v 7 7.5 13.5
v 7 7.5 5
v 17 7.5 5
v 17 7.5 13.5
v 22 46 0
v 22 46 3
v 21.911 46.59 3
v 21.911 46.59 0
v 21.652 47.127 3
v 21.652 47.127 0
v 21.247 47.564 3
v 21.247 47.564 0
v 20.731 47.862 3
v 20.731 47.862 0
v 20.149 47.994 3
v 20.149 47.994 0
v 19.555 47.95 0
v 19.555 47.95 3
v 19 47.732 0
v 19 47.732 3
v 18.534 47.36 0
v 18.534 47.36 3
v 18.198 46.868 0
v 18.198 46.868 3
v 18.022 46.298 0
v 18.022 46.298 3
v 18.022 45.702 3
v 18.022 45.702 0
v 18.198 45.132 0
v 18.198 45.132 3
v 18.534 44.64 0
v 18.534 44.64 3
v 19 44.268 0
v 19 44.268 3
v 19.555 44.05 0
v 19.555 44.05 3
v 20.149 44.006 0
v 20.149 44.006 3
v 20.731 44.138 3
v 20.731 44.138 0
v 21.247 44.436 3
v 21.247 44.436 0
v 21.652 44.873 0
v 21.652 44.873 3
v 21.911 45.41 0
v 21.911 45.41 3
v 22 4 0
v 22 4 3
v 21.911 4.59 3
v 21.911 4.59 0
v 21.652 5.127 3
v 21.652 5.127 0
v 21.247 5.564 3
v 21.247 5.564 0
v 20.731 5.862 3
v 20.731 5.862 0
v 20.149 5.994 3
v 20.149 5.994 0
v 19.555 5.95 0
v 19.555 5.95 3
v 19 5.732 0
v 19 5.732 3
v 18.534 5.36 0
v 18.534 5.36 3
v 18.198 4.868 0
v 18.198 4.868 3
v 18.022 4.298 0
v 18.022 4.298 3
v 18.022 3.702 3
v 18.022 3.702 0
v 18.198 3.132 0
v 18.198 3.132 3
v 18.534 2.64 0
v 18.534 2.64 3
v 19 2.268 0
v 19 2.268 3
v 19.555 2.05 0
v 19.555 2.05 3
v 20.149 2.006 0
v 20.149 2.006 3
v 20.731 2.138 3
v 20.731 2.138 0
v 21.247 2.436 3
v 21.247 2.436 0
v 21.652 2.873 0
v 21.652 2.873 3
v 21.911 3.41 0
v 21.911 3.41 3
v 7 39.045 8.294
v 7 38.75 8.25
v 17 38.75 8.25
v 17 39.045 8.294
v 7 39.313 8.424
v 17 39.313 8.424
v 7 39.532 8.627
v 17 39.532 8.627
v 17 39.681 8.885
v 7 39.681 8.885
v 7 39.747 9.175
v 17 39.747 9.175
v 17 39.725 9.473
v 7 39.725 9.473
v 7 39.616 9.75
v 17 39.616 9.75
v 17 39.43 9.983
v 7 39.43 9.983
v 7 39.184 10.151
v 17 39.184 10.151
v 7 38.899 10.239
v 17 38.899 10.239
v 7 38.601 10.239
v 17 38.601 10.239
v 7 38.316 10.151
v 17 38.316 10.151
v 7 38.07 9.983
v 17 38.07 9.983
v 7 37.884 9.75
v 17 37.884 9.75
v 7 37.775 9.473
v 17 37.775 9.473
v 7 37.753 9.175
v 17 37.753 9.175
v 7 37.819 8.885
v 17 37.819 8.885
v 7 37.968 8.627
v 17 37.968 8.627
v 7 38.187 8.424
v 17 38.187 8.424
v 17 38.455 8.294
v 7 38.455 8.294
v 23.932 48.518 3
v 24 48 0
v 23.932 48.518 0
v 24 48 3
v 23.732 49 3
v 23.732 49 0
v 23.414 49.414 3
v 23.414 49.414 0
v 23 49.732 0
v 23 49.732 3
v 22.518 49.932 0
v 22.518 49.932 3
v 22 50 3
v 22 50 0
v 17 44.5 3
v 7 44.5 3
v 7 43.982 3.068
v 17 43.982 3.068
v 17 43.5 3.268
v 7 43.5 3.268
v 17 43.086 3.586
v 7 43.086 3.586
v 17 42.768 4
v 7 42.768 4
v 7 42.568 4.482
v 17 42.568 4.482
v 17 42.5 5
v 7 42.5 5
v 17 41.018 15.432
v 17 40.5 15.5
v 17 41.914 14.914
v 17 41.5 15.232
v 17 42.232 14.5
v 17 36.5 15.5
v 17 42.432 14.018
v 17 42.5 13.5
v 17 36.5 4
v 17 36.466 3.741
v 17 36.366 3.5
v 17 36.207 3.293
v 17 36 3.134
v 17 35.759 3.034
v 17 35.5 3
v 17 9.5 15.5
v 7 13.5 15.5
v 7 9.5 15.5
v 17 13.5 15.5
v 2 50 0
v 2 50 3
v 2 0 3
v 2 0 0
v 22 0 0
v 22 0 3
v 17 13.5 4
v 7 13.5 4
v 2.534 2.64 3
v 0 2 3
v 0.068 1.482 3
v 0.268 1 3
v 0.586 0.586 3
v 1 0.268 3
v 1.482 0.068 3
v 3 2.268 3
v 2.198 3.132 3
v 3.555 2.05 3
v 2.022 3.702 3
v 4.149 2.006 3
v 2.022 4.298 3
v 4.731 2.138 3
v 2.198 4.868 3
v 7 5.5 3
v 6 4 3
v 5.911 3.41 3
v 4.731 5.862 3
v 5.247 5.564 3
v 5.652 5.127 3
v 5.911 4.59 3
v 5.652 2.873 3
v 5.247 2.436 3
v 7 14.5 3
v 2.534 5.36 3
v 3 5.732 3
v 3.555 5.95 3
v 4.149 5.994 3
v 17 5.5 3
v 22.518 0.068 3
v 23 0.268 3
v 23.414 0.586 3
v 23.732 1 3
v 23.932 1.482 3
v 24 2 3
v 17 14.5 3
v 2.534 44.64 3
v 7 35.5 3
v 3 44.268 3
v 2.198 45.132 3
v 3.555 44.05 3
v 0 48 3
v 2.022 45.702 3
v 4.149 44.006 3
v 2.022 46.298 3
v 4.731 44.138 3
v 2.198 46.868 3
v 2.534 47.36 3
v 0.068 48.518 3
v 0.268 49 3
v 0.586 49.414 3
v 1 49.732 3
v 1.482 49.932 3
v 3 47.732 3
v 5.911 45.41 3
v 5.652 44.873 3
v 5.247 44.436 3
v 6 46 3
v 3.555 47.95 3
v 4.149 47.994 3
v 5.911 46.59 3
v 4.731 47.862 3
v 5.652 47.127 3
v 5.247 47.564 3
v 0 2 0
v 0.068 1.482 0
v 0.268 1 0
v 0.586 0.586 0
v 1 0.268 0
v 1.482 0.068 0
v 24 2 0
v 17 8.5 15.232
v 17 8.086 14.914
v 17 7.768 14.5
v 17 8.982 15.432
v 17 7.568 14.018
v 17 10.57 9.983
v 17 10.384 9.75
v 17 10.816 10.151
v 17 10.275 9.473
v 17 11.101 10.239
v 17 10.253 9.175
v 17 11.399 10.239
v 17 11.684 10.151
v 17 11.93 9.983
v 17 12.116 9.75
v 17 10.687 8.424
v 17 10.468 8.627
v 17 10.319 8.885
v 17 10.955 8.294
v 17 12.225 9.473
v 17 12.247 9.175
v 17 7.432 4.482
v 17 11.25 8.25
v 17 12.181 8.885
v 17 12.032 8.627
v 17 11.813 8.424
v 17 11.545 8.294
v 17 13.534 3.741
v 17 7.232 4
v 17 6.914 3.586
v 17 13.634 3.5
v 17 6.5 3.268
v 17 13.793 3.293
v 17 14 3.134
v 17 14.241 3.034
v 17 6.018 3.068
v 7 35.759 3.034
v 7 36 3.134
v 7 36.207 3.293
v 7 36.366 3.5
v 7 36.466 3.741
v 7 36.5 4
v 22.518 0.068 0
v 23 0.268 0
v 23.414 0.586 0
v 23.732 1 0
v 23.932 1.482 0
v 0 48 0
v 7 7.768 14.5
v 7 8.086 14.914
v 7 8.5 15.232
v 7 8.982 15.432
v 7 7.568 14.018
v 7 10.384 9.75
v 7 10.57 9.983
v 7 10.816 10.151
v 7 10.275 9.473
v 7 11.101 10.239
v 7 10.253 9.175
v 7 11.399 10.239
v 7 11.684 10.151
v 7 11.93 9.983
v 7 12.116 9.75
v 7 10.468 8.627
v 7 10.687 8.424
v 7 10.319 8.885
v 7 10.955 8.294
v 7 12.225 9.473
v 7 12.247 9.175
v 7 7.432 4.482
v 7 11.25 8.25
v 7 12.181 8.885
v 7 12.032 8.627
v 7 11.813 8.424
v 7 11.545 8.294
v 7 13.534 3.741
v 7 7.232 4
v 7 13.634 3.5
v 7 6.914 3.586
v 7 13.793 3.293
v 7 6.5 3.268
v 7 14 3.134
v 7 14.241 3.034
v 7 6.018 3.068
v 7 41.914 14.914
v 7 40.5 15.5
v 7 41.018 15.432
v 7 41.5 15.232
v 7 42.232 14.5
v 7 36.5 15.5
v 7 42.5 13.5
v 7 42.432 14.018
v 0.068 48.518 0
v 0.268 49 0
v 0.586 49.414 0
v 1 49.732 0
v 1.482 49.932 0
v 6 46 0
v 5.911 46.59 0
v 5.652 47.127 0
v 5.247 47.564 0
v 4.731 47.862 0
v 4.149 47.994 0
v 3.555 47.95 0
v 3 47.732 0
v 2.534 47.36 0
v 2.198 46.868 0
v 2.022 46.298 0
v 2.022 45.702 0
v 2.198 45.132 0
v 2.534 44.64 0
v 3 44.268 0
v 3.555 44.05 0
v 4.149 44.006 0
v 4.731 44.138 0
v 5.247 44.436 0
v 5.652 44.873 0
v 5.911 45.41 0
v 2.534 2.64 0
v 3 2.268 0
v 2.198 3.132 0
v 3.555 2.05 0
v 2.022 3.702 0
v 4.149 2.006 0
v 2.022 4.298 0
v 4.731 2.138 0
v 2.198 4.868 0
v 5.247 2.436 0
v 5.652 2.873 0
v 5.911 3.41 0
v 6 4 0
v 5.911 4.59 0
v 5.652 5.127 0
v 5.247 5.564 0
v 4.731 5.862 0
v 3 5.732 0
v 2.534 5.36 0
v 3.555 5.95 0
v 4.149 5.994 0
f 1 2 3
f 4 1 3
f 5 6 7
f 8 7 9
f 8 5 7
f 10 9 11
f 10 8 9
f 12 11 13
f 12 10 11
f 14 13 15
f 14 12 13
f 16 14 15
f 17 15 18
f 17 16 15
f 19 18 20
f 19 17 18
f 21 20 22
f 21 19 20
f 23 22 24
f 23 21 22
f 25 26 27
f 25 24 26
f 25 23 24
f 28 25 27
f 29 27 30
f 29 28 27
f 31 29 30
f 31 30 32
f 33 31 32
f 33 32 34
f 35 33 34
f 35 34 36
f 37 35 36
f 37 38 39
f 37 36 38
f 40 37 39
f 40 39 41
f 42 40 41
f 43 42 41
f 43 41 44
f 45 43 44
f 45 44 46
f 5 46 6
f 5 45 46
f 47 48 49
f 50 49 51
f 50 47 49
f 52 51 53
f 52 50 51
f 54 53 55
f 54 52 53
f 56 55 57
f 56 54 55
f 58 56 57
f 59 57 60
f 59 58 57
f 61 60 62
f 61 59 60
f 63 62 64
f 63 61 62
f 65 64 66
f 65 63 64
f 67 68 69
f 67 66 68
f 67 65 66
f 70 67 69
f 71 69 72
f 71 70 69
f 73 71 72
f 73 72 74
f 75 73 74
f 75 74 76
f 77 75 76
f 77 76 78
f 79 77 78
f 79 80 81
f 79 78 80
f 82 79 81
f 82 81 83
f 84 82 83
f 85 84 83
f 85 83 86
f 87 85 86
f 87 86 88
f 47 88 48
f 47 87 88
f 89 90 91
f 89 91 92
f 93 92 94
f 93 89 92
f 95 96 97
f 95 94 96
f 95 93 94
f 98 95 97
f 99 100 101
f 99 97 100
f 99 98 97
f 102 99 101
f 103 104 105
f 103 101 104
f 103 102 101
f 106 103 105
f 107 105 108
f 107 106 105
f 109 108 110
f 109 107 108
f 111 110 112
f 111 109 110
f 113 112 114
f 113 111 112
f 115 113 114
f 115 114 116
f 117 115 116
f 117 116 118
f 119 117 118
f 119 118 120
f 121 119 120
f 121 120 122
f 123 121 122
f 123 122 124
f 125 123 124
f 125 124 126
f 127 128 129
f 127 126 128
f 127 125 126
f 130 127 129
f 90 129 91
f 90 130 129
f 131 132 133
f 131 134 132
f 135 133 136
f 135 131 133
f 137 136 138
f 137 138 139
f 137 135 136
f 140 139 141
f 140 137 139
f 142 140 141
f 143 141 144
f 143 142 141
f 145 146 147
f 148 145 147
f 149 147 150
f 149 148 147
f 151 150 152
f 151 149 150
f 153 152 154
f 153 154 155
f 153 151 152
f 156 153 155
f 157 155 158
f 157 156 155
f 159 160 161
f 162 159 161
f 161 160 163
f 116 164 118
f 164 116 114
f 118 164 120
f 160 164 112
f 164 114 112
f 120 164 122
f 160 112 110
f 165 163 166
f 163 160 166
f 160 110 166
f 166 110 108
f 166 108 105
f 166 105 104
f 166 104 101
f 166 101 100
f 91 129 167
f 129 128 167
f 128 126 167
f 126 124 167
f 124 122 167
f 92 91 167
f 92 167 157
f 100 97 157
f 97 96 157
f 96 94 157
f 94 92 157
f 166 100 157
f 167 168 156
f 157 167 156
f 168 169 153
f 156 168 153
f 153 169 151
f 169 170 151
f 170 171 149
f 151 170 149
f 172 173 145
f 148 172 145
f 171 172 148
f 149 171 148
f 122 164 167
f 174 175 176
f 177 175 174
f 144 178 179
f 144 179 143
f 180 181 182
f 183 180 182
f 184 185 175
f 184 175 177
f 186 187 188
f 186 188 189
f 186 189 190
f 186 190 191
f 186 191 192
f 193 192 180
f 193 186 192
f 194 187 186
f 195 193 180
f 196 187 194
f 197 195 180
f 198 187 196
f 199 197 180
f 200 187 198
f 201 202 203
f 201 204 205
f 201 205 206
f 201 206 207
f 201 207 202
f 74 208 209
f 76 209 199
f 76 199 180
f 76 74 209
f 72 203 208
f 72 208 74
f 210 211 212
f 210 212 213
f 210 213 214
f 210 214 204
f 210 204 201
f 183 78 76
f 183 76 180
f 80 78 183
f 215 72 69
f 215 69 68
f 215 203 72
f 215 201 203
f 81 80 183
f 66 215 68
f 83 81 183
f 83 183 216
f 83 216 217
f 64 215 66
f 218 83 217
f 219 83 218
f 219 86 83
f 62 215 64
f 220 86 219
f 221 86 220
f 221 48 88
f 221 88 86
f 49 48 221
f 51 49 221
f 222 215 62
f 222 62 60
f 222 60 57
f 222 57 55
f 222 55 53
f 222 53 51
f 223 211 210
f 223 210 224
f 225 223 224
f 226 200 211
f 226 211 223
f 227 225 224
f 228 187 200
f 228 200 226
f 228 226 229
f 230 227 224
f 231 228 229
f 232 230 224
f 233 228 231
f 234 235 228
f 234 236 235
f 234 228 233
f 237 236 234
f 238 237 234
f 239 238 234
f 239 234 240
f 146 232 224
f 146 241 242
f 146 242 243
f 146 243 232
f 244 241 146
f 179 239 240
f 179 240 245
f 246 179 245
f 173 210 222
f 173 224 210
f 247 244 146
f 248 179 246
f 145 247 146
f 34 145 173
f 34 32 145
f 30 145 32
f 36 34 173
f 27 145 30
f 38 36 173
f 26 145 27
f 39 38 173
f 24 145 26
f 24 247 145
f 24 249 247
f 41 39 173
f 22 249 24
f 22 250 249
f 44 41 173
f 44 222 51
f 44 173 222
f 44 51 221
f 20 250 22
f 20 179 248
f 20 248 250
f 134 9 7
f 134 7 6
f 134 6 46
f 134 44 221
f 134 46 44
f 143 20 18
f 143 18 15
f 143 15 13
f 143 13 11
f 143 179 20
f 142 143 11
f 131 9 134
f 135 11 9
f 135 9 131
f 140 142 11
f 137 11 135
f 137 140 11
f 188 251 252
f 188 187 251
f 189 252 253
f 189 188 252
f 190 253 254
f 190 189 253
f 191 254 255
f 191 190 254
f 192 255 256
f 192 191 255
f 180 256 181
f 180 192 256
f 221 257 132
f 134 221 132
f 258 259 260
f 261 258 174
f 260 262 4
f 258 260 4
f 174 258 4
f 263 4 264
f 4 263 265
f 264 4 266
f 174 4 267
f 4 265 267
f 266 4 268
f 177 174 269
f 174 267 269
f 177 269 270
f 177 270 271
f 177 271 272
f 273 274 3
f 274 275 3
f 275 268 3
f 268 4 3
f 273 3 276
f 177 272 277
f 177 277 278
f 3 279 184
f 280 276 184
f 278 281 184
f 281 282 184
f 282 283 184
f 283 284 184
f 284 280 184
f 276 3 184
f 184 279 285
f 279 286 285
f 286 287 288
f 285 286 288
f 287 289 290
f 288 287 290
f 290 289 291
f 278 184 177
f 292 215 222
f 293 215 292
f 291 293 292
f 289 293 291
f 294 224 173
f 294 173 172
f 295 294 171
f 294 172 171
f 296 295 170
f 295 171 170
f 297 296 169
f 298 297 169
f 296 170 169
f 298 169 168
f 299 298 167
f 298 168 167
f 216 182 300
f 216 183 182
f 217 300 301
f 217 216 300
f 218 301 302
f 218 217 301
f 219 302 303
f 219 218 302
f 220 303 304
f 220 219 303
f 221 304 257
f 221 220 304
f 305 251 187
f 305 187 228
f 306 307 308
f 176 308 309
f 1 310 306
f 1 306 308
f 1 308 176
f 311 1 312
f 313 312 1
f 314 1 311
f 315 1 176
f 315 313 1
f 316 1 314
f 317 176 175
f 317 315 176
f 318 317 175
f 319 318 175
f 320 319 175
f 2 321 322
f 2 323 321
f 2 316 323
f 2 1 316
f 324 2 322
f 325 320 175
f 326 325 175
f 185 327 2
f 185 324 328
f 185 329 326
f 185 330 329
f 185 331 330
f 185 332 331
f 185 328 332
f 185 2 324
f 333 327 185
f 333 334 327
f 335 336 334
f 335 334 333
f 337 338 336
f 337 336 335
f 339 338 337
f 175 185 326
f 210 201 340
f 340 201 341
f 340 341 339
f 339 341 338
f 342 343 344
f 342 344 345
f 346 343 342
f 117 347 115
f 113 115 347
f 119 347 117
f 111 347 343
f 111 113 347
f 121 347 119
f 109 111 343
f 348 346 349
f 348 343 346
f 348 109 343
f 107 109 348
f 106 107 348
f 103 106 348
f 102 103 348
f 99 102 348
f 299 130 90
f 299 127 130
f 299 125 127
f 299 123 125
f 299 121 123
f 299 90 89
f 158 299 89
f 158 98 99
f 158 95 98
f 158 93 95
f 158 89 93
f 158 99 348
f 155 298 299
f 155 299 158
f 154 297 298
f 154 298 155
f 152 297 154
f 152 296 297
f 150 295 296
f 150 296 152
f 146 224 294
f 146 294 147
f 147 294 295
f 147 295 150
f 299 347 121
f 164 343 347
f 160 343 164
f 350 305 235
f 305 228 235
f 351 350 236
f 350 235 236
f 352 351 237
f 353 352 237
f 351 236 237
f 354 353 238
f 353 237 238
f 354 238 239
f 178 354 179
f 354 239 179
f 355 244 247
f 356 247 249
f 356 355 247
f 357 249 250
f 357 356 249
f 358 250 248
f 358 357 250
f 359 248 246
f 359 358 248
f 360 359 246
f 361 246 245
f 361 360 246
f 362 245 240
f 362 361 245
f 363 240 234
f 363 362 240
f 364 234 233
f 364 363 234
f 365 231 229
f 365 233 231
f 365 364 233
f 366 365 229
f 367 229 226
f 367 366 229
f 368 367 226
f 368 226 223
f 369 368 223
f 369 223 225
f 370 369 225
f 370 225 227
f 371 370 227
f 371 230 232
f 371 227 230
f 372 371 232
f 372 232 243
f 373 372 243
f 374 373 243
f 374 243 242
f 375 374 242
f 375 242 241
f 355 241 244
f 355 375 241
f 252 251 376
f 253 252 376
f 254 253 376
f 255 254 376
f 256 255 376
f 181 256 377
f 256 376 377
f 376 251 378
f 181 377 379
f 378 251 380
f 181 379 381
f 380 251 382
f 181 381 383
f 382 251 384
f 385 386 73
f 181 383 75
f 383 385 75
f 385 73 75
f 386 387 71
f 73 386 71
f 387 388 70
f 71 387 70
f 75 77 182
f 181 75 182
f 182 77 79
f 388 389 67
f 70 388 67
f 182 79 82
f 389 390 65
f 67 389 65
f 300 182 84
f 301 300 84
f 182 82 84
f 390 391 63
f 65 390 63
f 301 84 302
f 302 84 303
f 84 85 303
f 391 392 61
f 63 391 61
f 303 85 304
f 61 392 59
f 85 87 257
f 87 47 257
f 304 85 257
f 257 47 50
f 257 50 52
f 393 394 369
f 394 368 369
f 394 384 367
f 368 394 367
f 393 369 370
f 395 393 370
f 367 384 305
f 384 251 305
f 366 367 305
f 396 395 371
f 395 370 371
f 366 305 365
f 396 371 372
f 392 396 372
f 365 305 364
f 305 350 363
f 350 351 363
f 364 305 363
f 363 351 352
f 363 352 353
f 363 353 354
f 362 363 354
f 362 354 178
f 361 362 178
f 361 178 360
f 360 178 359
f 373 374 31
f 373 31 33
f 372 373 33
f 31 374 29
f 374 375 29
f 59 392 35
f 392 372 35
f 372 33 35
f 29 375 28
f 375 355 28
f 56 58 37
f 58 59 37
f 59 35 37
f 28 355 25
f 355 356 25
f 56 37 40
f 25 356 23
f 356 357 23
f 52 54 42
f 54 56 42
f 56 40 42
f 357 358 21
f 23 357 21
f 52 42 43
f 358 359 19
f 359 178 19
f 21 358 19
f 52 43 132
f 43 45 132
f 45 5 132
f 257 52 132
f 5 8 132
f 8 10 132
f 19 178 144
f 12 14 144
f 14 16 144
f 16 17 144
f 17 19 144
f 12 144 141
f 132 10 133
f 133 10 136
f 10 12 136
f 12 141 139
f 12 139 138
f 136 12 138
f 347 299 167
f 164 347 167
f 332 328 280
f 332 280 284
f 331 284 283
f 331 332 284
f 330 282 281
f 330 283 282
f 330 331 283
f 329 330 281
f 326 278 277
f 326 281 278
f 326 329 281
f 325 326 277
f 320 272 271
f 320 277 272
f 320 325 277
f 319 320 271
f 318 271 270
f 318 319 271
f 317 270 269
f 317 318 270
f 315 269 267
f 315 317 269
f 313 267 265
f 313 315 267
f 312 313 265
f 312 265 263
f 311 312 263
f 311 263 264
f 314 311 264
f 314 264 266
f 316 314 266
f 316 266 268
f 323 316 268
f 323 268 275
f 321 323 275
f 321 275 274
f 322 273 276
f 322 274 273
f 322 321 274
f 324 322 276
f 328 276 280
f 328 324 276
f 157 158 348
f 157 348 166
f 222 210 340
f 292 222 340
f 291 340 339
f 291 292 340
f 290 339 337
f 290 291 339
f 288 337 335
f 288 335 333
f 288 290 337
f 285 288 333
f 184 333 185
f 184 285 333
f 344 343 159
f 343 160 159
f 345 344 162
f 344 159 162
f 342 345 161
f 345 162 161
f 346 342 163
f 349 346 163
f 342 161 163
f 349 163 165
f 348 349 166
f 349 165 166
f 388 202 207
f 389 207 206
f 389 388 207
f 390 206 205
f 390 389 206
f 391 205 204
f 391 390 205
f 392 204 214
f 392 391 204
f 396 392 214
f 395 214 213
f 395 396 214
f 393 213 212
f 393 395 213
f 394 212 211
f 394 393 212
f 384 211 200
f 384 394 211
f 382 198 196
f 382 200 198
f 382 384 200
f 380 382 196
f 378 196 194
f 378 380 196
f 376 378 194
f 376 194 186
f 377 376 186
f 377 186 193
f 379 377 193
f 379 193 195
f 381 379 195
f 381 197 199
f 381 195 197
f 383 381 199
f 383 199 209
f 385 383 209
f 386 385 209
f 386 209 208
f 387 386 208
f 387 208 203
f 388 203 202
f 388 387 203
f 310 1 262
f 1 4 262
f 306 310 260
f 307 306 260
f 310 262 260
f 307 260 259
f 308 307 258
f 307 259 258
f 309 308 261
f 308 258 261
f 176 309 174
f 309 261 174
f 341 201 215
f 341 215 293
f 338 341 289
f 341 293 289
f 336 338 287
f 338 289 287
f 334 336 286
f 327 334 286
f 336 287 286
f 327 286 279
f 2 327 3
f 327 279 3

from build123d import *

# Parameters (mm, degrees)
CYLINDER_R        = 1
CYLINDER_DEPTH    = 28
CYLINDER004_R     = 2
CYLINDER004_DEPTH = 10
CYLINDER005_R     = 2
CYLINDER005_DEPTH = 10
CYLINDER003_R     = 2
CYLINDER003_DEPTH = 10
CYLINDER001_R     = 1
CYLINDER001_DEPTH = 28
CYLINDER002_R     = 2
CYLINDER002_DEPTH = 10
BOX002_W          = 16
BOX002_H          = 23
BOX002_DEPTH      = 12.5
BOX001_W          = 10
BOX001_H          = 35
BOX001_DEPTH      = 12.5
BOX_W             = 24
BOX_H             = 50
BOX_DEPTH         = 3
FILLET_R          = 2
FILLET001_R       = 1
FILLET002_R       = 2
FILLET003_R       = 2


with BuildPart() as cylinder:
    # Cylinder → Cylinder (new body)
    with BuildSketch(Plane(origin=(0, 11.25, 9.25), x_dir=(0, 0, -1), z_dir=(1, 0, 0))):
        Circle(CYLINDER_R)
    extrude(amount=CYLINDER_DEPTH)


with BuildPart() as cylinder004:
    # Cylinder004 → Cylinder004 (new body)
    with BuildSketch(Plane(origin=(20, 4, 0), x_dir=(1, 0, 0), z_dir=(0, 0, 1))):
        Circle(CYLINDER004_R)
    extrude(amount=CYLINDER004_DEPTH)


with BuildPart() as cylinder005:
    # Cylinder005 → Cylinder005 (new body)
    with BuildSketch(Plane(origin=(20, 46, 0), x_dir=(1, 0, 0), z_dir=(0, 0, 1))):
        Circle(CYLINDER005_R)
    extrude(amount=CYLINDER005_DEPTH)


with BuildPart() as cylinder003:
    # Cylinder003 → Cylinder003 (new body)
    with BuildSketch(Plane(origin=(4, 46, 0), x_dir=(1, 0, 0), z_dir=(0, 0, 1))):
        Circle(CYLINDER003_R)
    extrude(amount=CYLINDER003_DEPTH)


with BuildPart() as cylinder001:
    # Cylinder001 → Cylinder001 (new body)
    with BuildSketch(Plane(origin=(0, 38.75, 9.25), x_dir=(0, 0, -1), z_dir=(1, 0, 0))):
        Circle(CYLINDER001_R)
    extrude(amount=CYLINDER001_DEPTH)


with BuildPart() as fusion001:
    # Cylinder002 → Cylinder002 (new body)
    with BuildSketch(Plane(origin=(4, 4, 0), x_dir=(1, 0, 0), z_dir=(0, 0, 1))):
        Circle(CYLINDER002_R)
    extrude(amount=CYLINDER002_DEPTH)

    # Fusion001: union Cylinder, Cylinder004, Cylinder005, Cylinder003, Cylinder001
    add(cylinder.part)
    add(cylinder004.part)
    add(cylinder005.part)
    add(cylinder003.part)
    add(cylinder001.part)


with BuildPart() as cube001:
    # Box002 → Box002 (new body)
    with BuildSketch(Plane(origin=(7, 13.5, 3), x_dir=(1, 0, 0), z_dir=(0, 0, 1))):
        with Locations((8, 11.5)):
            Rectangle(BOX002_W, BOX002_H)
    extrude(amount=BOX002_DEPTH)


with BuildPart() as cut:
    # Box001 → Box001 (new body)
    with BuildSketch(Plane(origin=(7, 7.5, 3), x_dir=(1, 0, 0), z_dir=(0, 0, 1))):
        with Locations((5, 17.5)):
            Rectangle(BOX001_W, BOX001_H)
    extrude(amount=BOX001_DEPTH)

    # Cut: cut Cube001
    add(cube001.part, mode=Mode.SUBTRACT)


with BuildPart() as fillet003:
    # Box → Box (new body)
    with BuildSketch(Plane.XY):
        with Locations((12, 25)):
            Rectangle(BOX_W, BOX_H)
    extrude(amount=BOX_DEPTH)

    # Fillet
    fillet_edges = [fillet003.edges().sort_by_distance(p)[0] for p in [
        (0, 0, 1.5),
        (0, 50, 1.5),
        (24, 0, 1.5),
        (24, 50, 1.5),
    ]]
    fillet(fillet_edges, radius=FILLET_R)

    # Fusion: union Cut
    add(cut.part)

    # Cut001: cut Fusion001
    add(fusion001.part, mode=Mode.SUBTRACT)

    # Fillet001
    fillet001_edges = [fillet003.edges().sort_by_distance(p)[0] for p in [
        (12, 13.5, 3),
        (12, 36.5, 3),
    ]]
    fillet(fillet001_edges, radius=FILLET001_R)

    # Fillet002
    fillet002_edges = [fillet003.edges().sort_by_distance(p)[0] for p in [
        (12, 7.5, 3),
        (12, 42.5, 3),
    ]]
    fillet(fillet002_edges, radius=FILLET002_R)

    # Fillet003
    fillet003_edges = [fillet003.edges().sort_by_distance(p)[0] for p in [
        (12, 7.5, 15.5),
        (12, 42.5, 15.5),
    ]]
    fillet(fillet003_edges, radius=FILLET003_R)


solid = fillet003.part
